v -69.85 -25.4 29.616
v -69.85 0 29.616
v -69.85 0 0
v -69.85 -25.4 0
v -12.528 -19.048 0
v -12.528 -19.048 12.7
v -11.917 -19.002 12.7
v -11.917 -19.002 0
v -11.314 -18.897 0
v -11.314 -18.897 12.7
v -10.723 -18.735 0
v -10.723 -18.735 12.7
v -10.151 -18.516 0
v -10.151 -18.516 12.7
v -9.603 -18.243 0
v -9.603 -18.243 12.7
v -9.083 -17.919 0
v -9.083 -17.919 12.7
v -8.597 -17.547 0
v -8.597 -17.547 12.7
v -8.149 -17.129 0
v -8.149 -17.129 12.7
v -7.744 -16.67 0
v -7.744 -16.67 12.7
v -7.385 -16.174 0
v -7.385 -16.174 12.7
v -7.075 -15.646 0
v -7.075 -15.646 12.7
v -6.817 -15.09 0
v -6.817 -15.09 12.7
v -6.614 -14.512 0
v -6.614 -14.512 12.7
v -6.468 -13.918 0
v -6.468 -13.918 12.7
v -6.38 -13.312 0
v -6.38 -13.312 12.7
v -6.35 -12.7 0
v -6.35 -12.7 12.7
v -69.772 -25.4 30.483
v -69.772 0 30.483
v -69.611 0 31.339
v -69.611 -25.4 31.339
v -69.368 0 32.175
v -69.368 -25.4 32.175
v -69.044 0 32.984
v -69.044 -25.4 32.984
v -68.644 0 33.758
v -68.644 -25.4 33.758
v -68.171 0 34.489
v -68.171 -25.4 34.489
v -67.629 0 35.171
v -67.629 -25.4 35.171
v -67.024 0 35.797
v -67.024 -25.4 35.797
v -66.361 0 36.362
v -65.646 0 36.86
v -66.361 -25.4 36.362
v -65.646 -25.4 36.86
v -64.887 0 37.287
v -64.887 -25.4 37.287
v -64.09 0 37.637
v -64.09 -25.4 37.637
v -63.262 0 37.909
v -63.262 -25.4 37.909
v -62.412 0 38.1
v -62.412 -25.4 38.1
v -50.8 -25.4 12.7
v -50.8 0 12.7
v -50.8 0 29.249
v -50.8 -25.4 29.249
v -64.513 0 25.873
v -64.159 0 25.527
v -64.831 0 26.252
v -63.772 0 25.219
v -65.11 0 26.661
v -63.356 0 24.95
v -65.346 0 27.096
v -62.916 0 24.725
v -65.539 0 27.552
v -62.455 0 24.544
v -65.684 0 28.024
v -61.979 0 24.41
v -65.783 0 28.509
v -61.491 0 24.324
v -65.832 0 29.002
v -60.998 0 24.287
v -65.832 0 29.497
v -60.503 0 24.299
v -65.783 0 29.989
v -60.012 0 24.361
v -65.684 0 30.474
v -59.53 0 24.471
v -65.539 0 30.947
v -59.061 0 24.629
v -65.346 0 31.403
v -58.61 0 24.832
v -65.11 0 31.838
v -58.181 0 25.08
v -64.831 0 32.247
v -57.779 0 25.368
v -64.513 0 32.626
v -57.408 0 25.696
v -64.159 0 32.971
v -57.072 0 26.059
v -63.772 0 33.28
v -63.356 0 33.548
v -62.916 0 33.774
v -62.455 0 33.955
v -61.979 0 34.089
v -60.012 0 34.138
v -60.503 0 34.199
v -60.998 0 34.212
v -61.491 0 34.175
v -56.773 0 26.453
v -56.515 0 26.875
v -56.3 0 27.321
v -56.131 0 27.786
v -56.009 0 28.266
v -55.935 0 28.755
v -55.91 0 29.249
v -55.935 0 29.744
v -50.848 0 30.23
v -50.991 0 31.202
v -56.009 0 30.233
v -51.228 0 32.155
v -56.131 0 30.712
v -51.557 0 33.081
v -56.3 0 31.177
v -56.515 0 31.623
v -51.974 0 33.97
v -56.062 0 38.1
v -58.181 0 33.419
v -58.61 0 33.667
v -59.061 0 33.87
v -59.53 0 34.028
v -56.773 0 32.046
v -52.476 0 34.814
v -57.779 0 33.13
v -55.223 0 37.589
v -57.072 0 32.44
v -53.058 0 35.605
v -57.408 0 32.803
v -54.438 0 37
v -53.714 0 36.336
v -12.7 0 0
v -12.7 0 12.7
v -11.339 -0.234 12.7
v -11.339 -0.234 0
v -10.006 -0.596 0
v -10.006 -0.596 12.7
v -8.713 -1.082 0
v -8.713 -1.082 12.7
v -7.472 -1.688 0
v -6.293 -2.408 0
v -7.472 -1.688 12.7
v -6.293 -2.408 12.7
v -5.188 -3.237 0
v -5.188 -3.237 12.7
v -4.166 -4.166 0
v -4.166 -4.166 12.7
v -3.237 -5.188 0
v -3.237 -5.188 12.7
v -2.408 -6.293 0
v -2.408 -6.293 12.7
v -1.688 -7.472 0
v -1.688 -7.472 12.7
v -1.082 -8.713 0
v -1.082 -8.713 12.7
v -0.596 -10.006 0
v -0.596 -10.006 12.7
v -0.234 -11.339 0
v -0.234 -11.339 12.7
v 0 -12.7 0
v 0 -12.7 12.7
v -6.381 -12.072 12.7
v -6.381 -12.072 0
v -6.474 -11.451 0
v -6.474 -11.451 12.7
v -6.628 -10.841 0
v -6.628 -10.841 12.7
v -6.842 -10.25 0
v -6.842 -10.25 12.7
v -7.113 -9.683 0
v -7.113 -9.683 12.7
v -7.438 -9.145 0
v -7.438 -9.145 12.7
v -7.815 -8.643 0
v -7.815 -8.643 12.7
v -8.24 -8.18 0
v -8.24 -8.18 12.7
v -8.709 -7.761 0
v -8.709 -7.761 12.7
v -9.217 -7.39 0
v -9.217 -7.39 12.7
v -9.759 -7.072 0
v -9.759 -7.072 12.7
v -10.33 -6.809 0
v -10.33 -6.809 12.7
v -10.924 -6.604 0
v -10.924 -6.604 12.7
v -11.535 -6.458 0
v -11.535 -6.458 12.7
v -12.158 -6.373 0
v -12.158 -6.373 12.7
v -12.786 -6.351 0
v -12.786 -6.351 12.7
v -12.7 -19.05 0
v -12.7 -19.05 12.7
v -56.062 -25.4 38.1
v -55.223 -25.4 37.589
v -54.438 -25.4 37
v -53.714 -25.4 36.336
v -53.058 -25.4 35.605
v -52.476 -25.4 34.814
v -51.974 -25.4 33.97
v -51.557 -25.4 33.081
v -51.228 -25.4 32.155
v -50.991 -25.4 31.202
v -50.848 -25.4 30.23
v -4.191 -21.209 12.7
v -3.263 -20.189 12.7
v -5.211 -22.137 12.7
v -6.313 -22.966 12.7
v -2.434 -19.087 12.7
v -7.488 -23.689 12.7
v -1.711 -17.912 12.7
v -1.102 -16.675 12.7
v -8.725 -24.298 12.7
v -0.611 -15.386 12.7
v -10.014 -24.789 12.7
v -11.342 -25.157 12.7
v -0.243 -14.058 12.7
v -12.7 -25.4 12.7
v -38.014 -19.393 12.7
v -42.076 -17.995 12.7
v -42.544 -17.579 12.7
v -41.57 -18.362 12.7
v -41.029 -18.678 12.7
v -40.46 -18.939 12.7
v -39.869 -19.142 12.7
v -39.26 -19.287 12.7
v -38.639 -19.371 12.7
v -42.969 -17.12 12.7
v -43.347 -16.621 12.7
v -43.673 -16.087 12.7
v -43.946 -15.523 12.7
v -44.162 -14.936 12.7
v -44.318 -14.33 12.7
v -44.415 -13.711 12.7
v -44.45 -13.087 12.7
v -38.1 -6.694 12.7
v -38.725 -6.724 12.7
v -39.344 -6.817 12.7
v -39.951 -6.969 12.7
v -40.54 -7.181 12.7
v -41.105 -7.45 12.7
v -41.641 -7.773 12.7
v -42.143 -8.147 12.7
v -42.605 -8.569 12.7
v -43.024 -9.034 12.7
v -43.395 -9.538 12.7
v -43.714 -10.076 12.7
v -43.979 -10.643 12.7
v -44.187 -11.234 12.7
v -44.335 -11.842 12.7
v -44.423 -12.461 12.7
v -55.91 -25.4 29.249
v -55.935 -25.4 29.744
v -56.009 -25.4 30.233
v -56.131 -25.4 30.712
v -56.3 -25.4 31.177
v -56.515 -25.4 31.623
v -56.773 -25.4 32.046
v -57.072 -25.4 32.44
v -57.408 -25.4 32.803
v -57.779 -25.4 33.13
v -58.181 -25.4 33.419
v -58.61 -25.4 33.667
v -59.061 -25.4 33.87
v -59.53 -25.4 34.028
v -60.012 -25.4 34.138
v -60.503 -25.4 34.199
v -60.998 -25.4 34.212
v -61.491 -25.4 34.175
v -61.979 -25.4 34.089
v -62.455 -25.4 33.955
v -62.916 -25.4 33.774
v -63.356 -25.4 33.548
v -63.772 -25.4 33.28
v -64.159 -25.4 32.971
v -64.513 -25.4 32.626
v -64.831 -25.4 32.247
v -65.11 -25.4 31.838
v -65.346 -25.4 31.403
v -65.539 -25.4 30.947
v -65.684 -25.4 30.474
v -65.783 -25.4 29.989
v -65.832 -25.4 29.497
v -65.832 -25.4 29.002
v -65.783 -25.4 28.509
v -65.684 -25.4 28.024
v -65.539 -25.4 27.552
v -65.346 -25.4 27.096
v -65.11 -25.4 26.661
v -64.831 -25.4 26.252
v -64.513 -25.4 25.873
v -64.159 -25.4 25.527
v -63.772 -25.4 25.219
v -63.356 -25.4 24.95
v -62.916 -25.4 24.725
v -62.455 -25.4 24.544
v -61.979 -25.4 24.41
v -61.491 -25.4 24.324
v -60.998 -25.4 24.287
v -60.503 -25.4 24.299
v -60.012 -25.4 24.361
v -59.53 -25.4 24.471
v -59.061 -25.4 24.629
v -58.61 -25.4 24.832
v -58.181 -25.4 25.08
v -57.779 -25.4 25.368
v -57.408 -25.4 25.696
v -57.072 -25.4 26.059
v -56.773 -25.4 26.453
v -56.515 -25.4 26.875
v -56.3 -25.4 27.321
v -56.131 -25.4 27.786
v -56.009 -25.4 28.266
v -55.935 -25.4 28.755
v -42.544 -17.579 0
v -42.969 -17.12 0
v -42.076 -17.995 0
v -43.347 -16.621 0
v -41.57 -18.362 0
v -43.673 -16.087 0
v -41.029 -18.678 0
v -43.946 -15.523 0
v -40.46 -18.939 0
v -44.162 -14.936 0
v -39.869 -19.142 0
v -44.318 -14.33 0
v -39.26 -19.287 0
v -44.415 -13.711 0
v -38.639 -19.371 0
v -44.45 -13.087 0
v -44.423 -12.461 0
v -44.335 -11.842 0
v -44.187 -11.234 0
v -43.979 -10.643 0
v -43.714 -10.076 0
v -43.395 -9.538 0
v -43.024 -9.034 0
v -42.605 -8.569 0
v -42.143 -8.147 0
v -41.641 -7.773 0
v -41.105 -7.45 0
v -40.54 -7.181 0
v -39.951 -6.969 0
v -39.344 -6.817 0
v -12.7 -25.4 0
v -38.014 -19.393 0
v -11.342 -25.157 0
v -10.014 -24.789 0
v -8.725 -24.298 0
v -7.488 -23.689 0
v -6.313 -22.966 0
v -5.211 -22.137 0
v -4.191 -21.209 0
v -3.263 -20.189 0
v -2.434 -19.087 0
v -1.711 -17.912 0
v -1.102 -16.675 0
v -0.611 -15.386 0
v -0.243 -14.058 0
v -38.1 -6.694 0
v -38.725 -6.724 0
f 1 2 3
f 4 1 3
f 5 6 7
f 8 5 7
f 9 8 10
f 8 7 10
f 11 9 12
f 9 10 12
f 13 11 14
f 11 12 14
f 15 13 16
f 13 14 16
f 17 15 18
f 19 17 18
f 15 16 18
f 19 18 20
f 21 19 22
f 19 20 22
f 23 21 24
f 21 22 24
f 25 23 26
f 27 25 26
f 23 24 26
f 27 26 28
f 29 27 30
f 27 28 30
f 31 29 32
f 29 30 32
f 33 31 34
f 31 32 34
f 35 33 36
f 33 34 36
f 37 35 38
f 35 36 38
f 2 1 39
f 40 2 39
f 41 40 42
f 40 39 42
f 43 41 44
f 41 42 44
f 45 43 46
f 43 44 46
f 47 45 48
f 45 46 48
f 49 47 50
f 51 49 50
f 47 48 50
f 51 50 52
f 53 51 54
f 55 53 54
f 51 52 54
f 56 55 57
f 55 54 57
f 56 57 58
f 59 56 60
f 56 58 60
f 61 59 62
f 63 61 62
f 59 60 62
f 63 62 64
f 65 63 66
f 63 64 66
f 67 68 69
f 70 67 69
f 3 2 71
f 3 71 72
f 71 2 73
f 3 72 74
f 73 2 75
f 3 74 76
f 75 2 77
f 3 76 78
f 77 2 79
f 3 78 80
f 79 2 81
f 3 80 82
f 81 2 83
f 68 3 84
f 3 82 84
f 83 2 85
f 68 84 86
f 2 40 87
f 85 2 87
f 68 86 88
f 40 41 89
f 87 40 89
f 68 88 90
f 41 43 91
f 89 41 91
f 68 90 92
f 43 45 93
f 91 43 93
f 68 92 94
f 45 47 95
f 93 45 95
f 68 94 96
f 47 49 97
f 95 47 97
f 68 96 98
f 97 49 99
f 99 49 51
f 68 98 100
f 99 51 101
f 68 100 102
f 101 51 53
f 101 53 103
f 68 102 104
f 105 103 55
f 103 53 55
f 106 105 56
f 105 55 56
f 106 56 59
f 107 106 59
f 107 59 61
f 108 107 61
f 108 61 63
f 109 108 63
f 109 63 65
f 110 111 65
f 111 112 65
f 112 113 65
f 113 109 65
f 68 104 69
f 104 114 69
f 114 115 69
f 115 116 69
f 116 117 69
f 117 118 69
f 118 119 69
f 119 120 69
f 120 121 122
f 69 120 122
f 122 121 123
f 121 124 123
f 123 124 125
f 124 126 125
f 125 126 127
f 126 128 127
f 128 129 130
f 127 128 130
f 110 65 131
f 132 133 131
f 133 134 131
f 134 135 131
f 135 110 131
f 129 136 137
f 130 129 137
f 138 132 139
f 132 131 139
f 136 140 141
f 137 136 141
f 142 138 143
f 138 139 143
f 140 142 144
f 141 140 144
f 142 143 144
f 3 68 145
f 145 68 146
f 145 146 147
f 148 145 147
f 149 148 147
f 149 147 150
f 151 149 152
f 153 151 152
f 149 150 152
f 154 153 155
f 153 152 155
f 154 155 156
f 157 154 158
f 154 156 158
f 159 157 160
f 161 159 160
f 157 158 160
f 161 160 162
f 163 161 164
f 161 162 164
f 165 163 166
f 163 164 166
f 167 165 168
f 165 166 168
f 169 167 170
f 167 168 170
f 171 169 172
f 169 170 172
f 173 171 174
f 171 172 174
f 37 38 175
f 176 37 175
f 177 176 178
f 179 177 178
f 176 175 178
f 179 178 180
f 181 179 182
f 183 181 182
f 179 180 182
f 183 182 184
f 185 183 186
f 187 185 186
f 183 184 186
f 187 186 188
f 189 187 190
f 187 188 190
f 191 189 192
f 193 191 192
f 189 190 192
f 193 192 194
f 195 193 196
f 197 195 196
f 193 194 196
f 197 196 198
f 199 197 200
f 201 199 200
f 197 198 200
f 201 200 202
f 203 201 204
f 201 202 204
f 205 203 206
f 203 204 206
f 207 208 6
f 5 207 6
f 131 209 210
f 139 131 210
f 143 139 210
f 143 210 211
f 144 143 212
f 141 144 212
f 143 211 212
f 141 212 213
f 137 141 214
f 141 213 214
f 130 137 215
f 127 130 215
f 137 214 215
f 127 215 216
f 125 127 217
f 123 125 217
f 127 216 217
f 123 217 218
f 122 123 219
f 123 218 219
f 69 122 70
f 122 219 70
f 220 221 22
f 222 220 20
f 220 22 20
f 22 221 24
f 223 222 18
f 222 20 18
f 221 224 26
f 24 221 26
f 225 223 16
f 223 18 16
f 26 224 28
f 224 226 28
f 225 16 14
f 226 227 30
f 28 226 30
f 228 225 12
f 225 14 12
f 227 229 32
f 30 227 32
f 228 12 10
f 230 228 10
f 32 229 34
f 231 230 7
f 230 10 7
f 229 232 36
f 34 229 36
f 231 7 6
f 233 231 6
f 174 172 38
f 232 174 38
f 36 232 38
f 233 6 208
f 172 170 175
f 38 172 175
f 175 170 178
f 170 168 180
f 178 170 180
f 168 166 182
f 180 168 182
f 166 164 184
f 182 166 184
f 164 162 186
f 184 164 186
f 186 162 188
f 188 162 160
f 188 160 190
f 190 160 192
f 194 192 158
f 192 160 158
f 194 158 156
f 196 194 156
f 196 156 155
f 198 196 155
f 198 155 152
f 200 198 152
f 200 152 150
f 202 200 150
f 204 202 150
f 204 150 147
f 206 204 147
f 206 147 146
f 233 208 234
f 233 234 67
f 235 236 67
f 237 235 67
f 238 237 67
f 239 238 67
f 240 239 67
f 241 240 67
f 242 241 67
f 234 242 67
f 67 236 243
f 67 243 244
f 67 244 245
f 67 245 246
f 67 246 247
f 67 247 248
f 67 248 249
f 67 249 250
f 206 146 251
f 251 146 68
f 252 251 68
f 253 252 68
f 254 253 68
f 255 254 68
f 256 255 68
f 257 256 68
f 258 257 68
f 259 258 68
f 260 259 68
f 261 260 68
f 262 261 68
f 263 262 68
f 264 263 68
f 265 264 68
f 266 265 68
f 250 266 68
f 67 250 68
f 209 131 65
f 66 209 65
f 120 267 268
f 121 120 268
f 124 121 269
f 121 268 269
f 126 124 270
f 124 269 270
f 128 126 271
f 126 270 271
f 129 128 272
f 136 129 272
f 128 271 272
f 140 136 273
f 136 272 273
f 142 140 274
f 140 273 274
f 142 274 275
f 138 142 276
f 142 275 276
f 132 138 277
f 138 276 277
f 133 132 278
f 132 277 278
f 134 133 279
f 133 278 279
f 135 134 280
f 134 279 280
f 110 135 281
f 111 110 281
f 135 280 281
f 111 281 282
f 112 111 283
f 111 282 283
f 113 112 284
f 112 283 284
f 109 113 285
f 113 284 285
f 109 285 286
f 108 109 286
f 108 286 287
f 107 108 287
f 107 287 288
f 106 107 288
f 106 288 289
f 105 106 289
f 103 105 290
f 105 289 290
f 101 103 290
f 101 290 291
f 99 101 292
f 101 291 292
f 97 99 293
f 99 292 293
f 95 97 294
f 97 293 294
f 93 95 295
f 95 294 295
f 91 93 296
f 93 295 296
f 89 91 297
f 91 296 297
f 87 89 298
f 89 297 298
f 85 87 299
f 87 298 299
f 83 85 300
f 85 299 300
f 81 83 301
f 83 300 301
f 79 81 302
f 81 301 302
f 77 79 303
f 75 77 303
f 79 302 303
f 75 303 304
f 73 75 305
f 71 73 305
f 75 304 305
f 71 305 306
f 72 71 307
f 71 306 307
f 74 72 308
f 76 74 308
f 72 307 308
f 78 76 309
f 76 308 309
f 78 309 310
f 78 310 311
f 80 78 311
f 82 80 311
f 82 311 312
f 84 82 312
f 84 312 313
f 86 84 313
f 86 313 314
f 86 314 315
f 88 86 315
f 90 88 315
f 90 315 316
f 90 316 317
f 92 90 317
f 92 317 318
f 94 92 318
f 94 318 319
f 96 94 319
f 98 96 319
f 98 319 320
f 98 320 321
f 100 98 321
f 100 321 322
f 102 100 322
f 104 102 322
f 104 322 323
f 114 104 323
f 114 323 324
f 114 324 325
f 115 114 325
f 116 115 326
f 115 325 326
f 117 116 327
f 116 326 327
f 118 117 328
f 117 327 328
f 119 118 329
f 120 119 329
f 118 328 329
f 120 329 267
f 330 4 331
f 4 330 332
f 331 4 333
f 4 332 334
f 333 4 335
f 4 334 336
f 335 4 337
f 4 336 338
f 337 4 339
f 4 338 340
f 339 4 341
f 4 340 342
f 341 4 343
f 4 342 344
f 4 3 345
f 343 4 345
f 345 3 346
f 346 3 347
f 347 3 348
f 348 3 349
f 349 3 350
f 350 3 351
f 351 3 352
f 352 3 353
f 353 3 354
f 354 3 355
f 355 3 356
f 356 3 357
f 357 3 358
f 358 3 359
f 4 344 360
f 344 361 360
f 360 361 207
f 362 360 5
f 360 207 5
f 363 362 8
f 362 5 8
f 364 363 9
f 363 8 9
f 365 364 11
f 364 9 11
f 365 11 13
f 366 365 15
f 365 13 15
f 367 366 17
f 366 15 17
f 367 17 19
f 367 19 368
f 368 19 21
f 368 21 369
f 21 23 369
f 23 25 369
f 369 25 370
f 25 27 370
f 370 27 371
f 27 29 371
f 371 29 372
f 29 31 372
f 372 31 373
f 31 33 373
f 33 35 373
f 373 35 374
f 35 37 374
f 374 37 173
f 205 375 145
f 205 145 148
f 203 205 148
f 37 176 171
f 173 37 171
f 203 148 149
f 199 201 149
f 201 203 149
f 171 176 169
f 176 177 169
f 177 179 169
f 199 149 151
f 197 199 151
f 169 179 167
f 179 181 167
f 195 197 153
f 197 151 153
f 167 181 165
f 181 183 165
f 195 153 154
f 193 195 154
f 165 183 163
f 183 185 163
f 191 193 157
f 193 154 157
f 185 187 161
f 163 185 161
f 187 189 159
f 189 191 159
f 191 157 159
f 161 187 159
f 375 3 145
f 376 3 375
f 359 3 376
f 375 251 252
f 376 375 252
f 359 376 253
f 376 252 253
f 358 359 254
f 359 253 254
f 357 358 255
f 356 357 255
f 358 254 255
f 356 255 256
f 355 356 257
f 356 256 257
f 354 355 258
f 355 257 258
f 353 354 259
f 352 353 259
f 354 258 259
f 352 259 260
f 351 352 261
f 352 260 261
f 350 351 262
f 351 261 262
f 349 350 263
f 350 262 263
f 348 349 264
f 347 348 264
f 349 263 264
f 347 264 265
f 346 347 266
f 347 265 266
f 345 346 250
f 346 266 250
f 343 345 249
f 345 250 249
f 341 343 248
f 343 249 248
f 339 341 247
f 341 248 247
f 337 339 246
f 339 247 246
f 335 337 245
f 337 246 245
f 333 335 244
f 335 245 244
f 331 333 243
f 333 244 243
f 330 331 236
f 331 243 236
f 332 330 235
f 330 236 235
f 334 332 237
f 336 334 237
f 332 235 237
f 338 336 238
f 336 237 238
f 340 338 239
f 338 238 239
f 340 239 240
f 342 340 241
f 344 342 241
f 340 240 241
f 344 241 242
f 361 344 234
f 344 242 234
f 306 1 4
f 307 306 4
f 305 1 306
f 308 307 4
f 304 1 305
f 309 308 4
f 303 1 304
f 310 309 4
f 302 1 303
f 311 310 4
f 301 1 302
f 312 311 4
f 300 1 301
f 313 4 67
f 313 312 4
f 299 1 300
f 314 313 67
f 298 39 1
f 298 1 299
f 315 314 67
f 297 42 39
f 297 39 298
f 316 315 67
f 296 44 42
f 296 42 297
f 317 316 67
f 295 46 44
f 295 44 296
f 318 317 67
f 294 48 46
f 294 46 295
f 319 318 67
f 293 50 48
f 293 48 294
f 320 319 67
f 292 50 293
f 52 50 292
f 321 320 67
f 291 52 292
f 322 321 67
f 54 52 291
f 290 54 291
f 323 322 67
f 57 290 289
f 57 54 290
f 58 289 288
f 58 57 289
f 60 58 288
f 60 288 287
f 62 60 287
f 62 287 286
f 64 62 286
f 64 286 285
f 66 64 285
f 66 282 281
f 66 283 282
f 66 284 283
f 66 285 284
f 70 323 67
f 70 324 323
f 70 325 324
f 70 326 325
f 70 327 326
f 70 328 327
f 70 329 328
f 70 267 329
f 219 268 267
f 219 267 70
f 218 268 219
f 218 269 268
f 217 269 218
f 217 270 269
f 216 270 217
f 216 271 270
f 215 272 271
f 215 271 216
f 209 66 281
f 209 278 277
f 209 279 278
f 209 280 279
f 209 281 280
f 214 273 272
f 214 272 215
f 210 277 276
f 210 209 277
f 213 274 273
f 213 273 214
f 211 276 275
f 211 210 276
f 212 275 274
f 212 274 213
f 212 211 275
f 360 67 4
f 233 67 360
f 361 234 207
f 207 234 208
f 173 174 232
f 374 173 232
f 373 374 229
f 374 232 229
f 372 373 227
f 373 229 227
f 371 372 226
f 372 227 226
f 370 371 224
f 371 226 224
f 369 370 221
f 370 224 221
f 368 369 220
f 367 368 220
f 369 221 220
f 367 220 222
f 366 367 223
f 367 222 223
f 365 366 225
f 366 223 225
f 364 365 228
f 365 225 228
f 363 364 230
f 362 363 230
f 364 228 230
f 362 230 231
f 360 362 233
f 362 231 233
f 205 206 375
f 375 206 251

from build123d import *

# Parameters (mm, degrees)
F1_DEPTH = 25.4
F3_DEPTH = 12.7
F5_DEPTH = 12.7
F7_DEPTH = 25.4
F8_R     = 4.9638904574
F9_DEPTH = 25.4


with BuildPart() as f1:
    # F0 (on Front) → F1 (new body)
    with BuildSketch(Plane.XZ):
        Polygon((-69.85, 38.1), (-69.85, 0), (0, 0), (0, 12.7), (-50.8, 12.7), (-50.8, 38.1), align=None)
    extrude(amount=F1_DEPTH)

    # F2 (on face) → F3 (cut)
    with BuildSketch(Plane.XY.offset(12.7)):
        with BuildLine():
            ThreePointArc((-12.7, 0), (-4.1664394472, -4.1664394472), (0, -12.7))
            Line((0, -12.7), (0, 0))
            Line((0, 0), (-12.7, 0))
        make_face()
        with BuildLine():
            Line((0, -25.4), (0, -12.7))
            ThreePointArc((0, -12.7), (-4.1912343362, -21.2087656638), (-12.7, -25.4))
            Line((-12.7, -25.4), (0, -25.4))
        make_face()
    extrude(amount=-F3_DEPTH, mode=Mode.SUBTRACT)

    # F4 (on face) → F5 (cut)
    with BuildSketch(Plane.XY.offset(12.7)):
        with BuildLine():
            ThreePointArc((-38.0139607827, -19.3930226044), (-33.5795548322, -17.5032103821), (-31.75, -13.0436055246))
            ThreePointArc((-31.75, -13.0436055246), (-33.6098719395, -8.5534774641), (-38.1, -6.6936055246))
            ThreePointArc((-38.1, -6.6936055246), (-44.4498542683, -13.0866261206), (-38.0139607827, -19.3930226044))
        make_face()
        with BuildLine():
            ThreePointArc((-38.1, -6.6936055246), (-33.6098719395, -8.5534774641), (-31.75, -13.0436055246))
            ThreePointArc((-31.75, -13.0436055246), (-33.5795548322, -17.5032103821), (-38.0139607827, -19.3930226044))
            Line((-38.0139607827, -19.3930226044), (-12.7000078464, -19.05))
            ThreePointArc((-12.7000078464, -19.05), (-19.049854295, -12.7430166511), (-12.7860391738, -6.3505829196))
            Line((-12.7860391738, -6.3505829196), (-38.1, -6.6936055246))
        make_face()
        with BuildLine():
            ThreePointArc((-6.35, -12.7), (-8.240395127, -8.1795548475), (-12.7860391738, -6.3505829196))
            ThreePointArc((-12.7860391738, -6.3505829196), (-19.049854295, -12.7430166511), (-12.7000078464, -19.05))
            Line((-12.7000078464, -19.05), (-12.5279294485, -19.0476682117))
            ThreePointArc((-12.5279294485, -19.0476682117), (-8.1494424516, -17.1288741232), (-6.35, -12.7))
        make_face()
    extrude(amount=-F5_DEPTH, mode=Mode.SUBTRACT)

    # F6 (on face) → F7 (cut)
    with BuildSketch(Plane.XZ.offset(25.4)):
        with BuildLine():
            Line((-69.85, 38.1), (-69.85, 29.6156106257))
            ThreePointArc((-69.85, 29.6156106257), (-67.6293367073, 35.171111242), (-62.4123890172, 38.1))
            Line((-62.4123890172, 38.1), (-69.85, 38.1))
        make_face()
        with BuildLine():
            Line((-50.8, 38.1), (-56.0623890172, 38.1))
            ThreePointArc((-56.0623890172, 38.1), (-52.2149677191, 34.3977887072), (-50.8, 29.2493049055))
            Line((-50.8, 29.2493049055), (-50.8, 38.1))
        make_face()
    extrude(amount=-F7_DEPTH, mode=Mode.SUBTRACT)

    # F8 (on face) → F9 (cut)
    with BuildSketch(Plane.XZ.offset(25.4)):
        with Locations((-60.8740881639, 29.2493049055)):
            Circle(F8_R)
    extrude(amount=-F9_DEPTH, mode=Mode.SUBTRACT)


solid = f1.part
